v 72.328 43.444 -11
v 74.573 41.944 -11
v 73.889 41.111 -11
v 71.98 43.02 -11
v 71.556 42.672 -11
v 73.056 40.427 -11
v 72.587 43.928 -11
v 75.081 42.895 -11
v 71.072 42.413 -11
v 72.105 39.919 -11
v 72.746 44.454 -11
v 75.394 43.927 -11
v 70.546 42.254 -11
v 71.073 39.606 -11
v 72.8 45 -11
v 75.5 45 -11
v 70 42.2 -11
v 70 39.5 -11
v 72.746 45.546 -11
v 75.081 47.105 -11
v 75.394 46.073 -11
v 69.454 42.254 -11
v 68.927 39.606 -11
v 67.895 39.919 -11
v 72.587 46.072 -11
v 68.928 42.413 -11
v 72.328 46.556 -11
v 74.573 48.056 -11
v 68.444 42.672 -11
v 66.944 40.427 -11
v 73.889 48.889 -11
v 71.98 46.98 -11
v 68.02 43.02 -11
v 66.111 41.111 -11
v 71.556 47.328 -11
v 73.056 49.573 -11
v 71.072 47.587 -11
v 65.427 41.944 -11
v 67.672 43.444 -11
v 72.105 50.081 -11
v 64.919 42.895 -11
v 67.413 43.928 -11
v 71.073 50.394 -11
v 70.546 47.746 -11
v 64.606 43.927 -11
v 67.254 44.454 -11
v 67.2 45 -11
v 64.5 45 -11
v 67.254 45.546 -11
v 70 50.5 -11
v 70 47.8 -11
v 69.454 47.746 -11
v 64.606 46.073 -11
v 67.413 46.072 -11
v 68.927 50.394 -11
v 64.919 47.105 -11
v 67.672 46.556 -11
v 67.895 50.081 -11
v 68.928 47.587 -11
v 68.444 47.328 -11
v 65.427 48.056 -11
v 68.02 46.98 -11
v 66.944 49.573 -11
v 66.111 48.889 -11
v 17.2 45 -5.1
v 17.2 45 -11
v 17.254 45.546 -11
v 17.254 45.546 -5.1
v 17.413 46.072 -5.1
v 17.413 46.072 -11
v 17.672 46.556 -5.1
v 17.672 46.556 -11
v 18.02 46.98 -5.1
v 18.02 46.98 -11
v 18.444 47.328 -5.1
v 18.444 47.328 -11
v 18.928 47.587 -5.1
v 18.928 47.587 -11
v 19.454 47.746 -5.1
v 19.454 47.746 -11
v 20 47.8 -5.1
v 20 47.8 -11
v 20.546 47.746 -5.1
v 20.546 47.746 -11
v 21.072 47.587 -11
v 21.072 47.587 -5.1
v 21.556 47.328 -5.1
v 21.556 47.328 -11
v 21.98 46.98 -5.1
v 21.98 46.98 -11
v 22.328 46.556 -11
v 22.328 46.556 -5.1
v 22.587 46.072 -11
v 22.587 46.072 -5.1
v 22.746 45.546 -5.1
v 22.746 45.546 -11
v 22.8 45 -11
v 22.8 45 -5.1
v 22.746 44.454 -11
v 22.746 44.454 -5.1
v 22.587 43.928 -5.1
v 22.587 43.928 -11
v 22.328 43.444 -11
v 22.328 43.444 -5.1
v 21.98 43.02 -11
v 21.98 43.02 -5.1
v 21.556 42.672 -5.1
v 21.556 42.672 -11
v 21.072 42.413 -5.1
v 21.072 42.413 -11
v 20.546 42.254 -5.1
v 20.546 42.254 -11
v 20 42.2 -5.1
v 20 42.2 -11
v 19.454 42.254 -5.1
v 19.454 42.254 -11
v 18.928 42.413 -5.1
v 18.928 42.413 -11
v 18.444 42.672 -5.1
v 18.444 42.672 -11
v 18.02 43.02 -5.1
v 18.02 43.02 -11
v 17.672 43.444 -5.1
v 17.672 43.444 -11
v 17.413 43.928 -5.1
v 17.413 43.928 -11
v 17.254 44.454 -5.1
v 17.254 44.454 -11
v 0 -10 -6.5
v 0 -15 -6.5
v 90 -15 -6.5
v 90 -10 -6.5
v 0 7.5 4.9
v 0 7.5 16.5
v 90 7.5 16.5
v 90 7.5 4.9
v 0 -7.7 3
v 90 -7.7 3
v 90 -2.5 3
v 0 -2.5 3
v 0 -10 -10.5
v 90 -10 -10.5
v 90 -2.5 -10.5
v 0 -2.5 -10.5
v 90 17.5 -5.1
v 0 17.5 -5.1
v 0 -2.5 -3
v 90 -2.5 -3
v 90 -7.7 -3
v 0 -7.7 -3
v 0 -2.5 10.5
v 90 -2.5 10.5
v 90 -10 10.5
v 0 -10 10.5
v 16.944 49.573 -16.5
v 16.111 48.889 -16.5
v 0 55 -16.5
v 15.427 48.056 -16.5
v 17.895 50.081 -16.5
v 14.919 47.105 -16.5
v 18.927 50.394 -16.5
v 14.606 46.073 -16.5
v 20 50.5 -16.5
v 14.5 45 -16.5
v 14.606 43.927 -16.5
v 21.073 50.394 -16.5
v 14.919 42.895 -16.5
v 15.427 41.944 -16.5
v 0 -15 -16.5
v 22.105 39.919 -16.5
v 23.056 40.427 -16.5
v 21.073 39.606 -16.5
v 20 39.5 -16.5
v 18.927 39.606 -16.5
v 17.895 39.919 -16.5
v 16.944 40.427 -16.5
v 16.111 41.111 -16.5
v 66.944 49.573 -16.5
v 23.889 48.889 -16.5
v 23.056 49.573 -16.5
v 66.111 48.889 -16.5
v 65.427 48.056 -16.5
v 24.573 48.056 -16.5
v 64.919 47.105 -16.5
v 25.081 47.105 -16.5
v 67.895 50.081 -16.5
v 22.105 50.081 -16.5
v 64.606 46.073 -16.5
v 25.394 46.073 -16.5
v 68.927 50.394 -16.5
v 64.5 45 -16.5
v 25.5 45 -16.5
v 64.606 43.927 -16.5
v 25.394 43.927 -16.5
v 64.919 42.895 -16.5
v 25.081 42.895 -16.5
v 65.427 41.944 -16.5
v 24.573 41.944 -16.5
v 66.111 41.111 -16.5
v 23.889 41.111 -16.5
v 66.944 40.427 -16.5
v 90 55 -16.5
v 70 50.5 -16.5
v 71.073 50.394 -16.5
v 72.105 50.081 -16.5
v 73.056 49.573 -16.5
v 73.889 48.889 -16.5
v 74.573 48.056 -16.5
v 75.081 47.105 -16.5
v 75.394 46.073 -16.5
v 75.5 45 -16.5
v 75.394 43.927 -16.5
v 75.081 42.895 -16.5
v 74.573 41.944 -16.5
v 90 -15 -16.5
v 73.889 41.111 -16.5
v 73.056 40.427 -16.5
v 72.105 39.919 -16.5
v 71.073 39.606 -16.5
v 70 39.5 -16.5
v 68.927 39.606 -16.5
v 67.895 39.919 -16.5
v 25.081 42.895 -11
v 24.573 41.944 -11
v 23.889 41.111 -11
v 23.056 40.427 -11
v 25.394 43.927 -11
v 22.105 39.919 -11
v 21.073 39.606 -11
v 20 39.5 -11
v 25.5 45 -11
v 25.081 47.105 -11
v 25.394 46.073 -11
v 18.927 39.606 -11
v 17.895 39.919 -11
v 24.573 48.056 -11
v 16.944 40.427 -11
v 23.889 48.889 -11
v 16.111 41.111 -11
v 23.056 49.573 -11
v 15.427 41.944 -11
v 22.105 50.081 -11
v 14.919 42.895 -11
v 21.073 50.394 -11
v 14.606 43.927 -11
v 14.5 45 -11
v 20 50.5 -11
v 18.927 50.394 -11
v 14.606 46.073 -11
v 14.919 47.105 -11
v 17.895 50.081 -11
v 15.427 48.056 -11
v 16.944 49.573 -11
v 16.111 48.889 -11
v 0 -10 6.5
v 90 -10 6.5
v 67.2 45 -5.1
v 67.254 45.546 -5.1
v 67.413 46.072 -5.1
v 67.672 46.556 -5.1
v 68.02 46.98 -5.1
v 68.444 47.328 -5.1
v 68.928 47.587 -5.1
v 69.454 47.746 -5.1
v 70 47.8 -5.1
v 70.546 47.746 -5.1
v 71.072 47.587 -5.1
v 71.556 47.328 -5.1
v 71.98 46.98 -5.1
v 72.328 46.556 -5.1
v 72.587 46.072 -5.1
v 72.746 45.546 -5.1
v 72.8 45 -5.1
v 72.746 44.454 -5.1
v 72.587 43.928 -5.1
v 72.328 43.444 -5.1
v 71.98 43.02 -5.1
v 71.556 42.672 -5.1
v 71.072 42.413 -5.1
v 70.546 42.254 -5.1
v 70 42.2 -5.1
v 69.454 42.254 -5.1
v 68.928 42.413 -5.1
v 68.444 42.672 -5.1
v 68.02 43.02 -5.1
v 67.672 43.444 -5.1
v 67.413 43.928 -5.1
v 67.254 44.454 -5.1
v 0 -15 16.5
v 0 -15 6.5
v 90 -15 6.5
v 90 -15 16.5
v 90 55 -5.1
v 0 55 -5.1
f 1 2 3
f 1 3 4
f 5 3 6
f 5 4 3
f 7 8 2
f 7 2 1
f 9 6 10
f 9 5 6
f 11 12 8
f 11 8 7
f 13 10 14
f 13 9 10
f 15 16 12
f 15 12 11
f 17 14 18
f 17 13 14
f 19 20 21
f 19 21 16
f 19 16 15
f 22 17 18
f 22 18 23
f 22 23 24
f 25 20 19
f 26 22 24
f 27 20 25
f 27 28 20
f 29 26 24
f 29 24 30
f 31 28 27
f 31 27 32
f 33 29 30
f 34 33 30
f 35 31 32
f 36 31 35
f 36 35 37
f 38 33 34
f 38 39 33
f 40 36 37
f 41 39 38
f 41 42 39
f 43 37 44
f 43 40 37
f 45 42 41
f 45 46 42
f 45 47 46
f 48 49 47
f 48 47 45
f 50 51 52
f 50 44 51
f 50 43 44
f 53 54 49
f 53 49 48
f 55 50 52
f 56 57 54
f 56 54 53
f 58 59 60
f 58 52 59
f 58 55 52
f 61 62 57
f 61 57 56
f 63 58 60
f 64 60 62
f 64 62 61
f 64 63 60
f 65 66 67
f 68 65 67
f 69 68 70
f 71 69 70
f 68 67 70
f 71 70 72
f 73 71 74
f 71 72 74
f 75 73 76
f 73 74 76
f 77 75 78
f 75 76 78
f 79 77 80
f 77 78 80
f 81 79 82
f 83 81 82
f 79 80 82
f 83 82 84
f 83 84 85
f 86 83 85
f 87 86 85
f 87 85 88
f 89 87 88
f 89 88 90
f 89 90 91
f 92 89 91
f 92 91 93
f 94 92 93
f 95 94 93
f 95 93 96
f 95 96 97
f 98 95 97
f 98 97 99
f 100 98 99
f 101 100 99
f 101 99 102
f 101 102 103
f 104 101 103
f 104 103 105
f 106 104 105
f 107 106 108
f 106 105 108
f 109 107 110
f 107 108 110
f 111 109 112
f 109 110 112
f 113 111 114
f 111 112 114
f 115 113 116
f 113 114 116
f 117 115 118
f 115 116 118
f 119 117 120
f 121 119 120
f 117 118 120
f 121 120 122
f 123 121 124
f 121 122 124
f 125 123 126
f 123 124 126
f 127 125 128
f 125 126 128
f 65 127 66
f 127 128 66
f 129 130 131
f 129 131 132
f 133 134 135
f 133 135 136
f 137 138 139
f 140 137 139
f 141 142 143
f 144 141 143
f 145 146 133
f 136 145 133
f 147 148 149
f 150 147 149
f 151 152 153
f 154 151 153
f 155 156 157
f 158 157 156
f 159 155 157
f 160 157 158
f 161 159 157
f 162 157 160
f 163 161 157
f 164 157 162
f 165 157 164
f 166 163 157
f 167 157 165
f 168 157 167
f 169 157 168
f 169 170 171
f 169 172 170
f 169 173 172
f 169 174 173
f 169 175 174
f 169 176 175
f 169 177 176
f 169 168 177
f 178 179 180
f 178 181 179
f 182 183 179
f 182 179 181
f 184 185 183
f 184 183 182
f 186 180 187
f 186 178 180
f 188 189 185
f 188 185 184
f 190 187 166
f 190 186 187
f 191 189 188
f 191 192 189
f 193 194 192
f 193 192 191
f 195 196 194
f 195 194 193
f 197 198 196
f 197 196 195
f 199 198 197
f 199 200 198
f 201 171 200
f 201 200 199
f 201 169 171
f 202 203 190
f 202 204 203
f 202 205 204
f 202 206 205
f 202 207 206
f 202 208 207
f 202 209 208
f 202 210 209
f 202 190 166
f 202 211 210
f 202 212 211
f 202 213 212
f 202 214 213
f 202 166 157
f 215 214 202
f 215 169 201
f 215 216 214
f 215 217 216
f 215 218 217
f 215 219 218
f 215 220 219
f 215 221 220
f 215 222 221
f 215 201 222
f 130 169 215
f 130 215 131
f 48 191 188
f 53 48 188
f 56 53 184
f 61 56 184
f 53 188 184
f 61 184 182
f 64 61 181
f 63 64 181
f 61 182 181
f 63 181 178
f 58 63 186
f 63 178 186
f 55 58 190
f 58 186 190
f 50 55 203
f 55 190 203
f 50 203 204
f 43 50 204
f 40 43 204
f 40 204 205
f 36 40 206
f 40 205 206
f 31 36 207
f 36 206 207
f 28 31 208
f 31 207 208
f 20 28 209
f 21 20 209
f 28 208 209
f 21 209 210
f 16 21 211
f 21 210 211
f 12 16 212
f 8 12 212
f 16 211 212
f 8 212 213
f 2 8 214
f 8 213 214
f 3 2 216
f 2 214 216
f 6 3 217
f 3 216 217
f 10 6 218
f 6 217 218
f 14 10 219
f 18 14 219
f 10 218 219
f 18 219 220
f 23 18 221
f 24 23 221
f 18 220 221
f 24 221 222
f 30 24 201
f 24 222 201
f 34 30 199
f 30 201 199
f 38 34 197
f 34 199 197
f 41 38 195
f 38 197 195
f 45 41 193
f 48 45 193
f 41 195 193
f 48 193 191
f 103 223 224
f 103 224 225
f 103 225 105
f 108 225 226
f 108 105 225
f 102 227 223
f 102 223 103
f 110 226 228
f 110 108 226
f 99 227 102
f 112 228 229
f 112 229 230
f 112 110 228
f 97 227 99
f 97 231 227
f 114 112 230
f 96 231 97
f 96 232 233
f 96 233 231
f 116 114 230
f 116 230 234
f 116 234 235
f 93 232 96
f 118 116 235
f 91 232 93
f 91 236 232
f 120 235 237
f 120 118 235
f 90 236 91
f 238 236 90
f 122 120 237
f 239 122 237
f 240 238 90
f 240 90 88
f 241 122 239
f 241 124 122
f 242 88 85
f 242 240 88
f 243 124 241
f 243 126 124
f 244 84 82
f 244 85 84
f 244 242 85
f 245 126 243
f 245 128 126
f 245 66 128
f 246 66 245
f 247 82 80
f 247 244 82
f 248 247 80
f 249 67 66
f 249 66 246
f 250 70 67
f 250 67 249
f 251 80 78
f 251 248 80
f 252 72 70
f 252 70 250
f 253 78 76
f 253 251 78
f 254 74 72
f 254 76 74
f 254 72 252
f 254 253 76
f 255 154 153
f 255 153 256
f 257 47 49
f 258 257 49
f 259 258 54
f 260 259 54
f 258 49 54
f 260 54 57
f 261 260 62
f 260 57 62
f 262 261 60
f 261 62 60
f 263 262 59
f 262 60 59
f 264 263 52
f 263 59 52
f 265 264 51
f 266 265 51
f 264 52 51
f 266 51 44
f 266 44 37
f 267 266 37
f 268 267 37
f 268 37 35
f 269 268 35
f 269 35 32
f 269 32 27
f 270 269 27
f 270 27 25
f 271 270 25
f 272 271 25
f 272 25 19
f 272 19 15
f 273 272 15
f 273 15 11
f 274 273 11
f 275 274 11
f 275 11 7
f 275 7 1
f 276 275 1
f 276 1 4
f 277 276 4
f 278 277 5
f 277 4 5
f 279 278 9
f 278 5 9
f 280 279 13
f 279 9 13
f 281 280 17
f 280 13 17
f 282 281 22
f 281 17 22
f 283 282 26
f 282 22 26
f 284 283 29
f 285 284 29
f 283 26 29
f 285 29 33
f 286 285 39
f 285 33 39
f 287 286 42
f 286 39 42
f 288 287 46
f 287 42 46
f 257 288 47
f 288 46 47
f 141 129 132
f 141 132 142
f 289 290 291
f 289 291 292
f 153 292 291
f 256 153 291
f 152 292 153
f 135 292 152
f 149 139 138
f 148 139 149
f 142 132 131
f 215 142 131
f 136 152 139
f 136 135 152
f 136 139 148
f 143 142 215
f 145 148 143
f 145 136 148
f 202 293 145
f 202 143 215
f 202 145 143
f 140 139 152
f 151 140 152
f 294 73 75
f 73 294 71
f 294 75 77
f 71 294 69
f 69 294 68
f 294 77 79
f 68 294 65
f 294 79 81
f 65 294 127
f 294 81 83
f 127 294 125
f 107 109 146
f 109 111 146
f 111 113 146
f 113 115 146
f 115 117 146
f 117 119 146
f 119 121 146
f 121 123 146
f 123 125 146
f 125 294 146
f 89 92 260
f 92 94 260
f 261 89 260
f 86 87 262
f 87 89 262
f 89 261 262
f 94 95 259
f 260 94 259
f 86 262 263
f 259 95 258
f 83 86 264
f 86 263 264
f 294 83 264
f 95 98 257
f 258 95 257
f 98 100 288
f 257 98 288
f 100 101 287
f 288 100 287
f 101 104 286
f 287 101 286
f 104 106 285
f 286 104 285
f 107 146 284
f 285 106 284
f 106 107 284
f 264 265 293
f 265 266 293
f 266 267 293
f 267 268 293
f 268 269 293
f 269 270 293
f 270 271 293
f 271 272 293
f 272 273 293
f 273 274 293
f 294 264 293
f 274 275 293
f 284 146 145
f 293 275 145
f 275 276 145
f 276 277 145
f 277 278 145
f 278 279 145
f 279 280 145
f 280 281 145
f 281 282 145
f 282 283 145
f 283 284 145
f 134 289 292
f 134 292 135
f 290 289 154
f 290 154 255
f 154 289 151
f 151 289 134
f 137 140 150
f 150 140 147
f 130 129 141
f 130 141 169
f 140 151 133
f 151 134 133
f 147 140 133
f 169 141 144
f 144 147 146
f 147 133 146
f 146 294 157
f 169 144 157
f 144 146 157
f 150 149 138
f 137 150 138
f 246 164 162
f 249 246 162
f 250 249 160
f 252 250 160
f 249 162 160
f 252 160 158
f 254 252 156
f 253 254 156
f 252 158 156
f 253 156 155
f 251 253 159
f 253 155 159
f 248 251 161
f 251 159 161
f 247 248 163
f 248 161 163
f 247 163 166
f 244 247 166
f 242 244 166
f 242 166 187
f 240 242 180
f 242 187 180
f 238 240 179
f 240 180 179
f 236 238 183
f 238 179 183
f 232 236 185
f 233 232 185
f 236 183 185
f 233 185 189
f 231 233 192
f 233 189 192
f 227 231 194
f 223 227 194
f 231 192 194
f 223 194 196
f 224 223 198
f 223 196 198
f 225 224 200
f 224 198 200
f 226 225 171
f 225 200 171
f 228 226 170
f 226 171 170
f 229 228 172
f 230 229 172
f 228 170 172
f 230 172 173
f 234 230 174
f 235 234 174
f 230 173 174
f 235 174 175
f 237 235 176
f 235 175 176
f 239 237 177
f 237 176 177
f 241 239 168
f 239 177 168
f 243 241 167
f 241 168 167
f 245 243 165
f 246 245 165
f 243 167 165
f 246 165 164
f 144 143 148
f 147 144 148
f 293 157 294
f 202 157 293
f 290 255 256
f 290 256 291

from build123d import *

# Parameters (mm, degrees)
BOSS_EXTRUDE1_DEPTH = 90
SKETCH3_W           = 90
SKETCH3_H           = 11.4
BOSS_EXTRUDE3_DEPTH = 47.5
SKETCH6_R           = 5.5
CUT_EXTRUDE3_DEPTH  = 5.5
SKETCH7_R           = 2.8
CUT_EXTRUDE4_DEPTH  = 10
BOSS_EXTRUDE4_DEPTH = 90


with BuildPart() as part:
    # Sketch1 → Boss-Extrude1 (new body)
    with BuildSketch(Plane(origin=(0, 0, 0), x_dir=(0, 0, -1), z_dir=(1, 0, 0))):
        Polygon((-16.5, 7.5), (16.5, 7.5), (16.5, -15), (6.5, -15), (6.5, -10), (10.5, -10), (10.5, -2.5), (3, -2.5), (3, -7.7), (-3, -7.7), (-3, -2.5), (-10.5, -2.5), (-10.5, -10), (-6.5, -10), (-6.5, -15), (-16.5, -15), align=None)
    extrude(amount=BOSS_EXTRUDE1_DEPTH)

    # Sketch3 → Boss-Extrude3 (add)
    with BuildSketch(Plane(origin=(0, 7.5, 0), x_dir=(1, 0, 0), z_dir=(0, 1, 0))):
        with Locations((45, 10.8)):
            Rectangle(SKETCH3_W, SKETCH3_H)
    extrude(amount=BOSS_EXTRUDE3_DEPTH)

    # Sketch6 → Cut-Extrude3 (cut)
    with BuildSketch(Plane(origin=(0, 0, -16.5), x_dir=(-1, 0, 0), z_dir=(0, 0, -1))):
        with Locations((-70, 45)):
            Circle(SKETCH6_R)
        with Locations((-20, 45)):
            Circle(SKETCH6_R)
    extrude(amount=-CUT_EXTRUDE3_DEPTH, mode=Mode.SUBTRACT)

    # Sketch7 → Cut-Extrude4 (cut)
    with BuildSketch(Plane(origin=(0, 0, -11), x_dir=(-1, 0, 0), z_dir=(0, 0, -1))):
        with Locations((-70, 45)):
            Circle(SKETCH7_R)
        with Locations((-20, 45)):
            Circle(SKETCH7_R)
    extrude(amount=-CUT_EXTRUDE4_DEPTH, mode=Mode.SUBTRACT)

    # Sketch11 → Boss-Extrude4 (add)
    with BuildSketch(Plane.ZY):
        Polygon((-5.1, 17.5), (4.9, 7.5), (-5.1, 7.5), align=None)
    extrude(amount=-BOSS_EXTRUDE4_DEPTH)


solid = part.part
